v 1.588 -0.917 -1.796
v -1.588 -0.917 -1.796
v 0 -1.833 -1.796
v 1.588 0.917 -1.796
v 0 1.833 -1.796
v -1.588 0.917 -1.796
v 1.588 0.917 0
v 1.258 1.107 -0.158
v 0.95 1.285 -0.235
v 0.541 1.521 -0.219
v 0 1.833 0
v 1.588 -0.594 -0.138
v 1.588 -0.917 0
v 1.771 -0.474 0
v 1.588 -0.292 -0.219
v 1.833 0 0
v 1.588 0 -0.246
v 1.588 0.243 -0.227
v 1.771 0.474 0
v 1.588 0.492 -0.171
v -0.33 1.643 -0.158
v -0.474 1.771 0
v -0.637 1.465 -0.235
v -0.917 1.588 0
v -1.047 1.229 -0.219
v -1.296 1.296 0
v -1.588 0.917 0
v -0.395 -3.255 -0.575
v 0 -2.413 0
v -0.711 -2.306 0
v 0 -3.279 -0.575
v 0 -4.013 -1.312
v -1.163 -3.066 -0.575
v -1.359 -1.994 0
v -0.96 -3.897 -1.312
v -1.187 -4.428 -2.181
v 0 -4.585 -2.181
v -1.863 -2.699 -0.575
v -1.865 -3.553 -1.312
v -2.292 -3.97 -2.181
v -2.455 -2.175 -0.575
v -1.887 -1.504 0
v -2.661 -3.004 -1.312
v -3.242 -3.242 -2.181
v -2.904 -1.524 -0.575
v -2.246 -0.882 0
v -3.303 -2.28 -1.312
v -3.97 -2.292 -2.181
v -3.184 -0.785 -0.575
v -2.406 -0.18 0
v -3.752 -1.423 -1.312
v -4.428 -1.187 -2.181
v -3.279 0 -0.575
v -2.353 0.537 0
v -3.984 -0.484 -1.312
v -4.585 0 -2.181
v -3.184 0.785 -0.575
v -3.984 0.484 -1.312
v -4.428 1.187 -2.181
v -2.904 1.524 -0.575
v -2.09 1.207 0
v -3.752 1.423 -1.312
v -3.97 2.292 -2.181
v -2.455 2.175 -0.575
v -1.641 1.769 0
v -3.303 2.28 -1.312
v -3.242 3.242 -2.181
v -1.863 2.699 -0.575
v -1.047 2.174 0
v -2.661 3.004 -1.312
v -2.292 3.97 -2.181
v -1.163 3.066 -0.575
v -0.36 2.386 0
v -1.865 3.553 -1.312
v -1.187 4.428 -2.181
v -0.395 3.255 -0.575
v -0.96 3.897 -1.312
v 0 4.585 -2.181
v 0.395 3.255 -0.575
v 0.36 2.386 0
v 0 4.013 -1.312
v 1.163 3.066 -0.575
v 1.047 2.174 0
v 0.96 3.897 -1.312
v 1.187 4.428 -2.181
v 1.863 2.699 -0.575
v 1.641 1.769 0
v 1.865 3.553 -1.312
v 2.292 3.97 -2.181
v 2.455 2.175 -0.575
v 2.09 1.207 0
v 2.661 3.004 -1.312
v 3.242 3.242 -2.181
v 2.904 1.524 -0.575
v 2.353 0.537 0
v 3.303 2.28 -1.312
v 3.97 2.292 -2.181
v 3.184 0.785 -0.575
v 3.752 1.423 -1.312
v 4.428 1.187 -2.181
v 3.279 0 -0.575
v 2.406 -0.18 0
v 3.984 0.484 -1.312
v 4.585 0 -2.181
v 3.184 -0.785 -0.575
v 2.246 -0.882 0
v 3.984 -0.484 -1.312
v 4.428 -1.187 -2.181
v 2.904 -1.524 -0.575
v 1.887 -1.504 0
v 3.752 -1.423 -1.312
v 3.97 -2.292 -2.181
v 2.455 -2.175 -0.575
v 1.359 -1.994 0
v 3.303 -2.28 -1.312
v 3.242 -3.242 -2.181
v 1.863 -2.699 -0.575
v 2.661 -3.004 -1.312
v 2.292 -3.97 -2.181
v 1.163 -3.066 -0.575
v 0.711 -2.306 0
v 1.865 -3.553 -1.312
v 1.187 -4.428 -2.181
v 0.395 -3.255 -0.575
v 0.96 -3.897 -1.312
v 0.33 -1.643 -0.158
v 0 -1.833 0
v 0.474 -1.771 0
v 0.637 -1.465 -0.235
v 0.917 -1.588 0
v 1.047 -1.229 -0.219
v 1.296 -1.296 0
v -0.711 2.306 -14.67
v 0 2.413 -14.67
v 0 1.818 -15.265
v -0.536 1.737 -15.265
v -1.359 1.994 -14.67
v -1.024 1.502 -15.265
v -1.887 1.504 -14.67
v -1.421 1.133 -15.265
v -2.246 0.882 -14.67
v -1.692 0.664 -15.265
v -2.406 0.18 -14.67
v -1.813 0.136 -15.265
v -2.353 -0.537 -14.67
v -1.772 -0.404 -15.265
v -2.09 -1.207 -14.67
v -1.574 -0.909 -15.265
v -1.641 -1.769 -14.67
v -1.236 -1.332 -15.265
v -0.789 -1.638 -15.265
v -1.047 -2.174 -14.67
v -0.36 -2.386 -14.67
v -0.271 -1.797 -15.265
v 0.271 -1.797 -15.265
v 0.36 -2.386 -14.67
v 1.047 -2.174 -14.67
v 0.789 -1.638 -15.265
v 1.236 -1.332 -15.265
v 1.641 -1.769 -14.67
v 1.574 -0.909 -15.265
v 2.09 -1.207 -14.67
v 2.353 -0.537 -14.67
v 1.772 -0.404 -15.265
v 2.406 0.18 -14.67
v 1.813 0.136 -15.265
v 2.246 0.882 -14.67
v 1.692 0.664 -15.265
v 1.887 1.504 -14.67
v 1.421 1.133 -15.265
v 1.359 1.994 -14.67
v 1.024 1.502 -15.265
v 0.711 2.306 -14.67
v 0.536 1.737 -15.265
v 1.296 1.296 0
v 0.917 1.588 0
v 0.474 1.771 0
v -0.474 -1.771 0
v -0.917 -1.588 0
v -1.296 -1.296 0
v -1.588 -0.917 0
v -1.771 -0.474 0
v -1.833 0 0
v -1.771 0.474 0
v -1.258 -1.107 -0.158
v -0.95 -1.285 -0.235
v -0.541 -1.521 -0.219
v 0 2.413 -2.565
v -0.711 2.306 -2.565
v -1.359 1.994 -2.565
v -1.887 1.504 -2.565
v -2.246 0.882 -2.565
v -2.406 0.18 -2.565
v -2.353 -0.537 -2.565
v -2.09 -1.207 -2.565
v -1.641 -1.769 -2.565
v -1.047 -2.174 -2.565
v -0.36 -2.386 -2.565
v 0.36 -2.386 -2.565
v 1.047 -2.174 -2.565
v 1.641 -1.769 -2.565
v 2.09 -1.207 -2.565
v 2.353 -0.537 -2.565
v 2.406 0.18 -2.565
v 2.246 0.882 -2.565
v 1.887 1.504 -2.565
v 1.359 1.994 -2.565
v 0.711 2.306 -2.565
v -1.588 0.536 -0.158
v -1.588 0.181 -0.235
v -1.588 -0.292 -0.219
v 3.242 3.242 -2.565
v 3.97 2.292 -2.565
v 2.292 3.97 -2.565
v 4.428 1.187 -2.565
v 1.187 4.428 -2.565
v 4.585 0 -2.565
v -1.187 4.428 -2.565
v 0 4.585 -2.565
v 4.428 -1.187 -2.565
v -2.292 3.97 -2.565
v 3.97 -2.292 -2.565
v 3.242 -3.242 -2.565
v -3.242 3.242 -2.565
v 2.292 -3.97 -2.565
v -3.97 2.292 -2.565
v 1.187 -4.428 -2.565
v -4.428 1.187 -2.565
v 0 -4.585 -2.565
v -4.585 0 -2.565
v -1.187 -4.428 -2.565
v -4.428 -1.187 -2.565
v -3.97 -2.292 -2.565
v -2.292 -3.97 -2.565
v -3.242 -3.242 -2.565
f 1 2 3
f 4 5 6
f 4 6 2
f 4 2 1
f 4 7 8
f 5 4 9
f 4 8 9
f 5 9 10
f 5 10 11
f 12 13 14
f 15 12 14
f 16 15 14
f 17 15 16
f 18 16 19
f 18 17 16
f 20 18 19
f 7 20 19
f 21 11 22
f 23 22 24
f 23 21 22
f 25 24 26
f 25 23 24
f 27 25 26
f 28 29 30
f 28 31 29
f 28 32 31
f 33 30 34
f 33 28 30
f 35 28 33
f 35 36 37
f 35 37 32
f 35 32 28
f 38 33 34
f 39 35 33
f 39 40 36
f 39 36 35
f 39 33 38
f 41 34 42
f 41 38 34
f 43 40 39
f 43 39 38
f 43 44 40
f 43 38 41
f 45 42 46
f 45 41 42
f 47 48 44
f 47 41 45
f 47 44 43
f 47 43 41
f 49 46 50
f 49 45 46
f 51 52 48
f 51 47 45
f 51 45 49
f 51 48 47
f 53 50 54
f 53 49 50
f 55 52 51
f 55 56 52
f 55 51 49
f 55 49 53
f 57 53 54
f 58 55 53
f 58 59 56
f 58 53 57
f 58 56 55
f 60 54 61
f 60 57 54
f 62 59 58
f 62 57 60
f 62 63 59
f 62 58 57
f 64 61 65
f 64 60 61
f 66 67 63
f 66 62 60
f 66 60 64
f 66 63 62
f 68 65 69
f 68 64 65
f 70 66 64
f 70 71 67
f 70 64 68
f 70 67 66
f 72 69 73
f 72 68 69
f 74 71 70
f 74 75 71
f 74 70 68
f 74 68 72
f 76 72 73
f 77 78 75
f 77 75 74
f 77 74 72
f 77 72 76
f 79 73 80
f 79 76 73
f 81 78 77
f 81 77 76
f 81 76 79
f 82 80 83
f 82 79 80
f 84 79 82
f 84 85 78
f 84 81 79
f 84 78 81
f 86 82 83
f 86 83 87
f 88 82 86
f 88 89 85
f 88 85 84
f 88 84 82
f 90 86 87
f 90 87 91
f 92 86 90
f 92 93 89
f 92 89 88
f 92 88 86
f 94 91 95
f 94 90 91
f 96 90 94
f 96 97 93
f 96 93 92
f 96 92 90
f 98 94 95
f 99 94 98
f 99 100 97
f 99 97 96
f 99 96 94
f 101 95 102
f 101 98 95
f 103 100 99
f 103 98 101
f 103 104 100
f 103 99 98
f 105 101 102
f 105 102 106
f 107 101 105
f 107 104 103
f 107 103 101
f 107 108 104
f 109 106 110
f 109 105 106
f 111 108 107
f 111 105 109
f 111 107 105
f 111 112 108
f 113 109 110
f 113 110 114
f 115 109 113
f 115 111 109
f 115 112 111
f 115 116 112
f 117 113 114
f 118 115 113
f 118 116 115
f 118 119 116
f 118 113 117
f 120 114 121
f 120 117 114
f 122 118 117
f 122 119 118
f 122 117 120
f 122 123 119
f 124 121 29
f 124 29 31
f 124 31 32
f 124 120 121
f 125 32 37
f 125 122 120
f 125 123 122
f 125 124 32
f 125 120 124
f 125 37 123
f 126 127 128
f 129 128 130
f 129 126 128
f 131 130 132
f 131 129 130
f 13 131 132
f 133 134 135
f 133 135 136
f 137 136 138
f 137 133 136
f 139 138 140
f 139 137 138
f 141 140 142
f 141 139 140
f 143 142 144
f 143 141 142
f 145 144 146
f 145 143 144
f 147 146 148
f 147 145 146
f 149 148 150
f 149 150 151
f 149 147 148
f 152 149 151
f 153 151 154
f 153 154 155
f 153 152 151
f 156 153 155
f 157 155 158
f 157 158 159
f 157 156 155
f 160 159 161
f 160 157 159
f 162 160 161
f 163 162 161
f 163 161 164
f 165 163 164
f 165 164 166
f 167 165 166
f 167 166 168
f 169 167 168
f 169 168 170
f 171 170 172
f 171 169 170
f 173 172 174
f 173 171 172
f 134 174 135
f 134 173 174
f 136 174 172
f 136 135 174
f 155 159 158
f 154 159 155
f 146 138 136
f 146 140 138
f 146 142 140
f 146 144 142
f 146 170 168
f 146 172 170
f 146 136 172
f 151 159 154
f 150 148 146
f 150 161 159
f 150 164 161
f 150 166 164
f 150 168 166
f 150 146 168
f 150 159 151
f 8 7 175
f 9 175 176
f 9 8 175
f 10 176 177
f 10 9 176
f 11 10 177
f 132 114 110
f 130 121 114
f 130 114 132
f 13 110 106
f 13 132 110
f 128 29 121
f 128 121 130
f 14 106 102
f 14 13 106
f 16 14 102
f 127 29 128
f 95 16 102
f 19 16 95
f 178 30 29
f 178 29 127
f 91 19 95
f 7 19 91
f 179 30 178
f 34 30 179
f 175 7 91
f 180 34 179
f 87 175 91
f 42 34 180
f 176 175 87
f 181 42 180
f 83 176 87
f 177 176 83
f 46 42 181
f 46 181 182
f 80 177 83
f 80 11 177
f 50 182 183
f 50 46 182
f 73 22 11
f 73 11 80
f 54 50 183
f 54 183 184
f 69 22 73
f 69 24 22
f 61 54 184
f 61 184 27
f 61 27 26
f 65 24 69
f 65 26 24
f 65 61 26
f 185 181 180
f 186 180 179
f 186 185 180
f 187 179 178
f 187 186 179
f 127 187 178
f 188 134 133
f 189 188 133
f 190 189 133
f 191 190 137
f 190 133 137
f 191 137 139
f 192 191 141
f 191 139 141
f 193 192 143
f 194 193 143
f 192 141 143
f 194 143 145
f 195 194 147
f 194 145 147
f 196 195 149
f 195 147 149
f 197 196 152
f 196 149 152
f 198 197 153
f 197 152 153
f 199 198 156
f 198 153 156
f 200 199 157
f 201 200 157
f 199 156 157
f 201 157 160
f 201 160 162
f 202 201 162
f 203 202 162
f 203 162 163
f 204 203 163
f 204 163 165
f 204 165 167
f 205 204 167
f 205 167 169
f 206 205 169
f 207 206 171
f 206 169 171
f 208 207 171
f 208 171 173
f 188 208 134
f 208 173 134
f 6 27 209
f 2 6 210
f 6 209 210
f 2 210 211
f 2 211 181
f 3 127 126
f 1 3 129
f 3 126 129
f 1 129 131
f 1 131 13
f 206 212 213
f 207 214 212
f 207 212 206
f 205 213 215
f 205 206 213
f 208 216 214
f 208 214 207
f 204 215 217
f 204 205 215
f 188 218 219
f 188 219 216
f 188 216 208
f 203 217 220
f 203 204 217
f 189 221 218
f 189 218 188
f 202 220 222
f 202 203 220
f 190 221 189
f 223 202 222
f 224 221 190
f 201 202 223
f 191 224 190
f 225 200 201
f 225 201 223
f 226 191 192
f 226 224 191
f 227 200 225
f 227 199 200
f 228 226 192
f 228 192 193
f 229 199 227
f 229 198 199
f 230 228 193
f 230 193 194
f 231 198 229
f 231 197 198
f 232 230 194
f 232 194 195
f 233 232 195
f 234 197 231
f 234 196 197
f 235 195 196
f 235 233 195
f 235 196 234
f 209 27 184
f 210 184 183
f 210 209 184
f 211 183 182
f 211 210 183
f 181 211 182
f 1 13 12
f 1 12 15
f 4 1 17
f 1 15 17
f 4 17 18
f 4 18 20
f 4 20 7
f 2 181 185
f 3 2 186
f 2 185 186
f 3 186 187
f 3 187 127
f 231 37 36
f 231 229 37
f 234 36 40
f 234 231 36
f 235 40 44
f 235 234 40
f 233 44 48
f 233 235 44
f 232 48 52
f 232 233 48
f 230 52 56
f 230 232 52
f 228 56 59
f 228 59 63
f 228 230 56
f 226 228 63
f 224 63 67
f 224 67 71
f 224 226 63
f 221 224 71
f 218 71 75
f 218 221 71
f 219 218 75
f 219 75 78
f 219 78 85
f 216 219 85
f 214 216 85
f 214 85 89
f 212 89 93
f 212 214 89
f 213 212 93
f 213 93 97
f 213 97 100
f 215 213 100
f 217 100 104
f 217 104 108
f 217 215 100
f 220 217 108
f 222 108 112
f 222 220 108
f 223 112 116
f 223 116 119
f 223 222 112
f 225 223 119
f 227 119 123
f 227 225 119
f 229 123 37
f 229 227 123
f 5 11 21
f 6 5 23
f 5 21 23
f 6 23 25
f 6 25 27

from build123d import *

# Parameters (mm, degrees)
SKETCH1_W          = 12.7
SKETCH1_H          = 2.413
CHAMFER1_SIZE      = 0.5953125
CUT_EXTRUDE2_DEPTH = 1.79578
SKETCH6_R          = 1.833087105
CUT_EXTRUDE3_DEPTH = 1.79578
CUT_EXTRUDE3_TAPER = 45


with BuildPart() as part:
    # Sketch1 → Revolve1 (revolve)
    with BuildSketch(Plane(origin=(0, 0, 0), x_dir=(0, 0, -1), z_dir=(1, 0, 0))):
        with Locations((8.9154, 1.2065)):
            Rectangle(SKETCH1_W, SKETCH1_H)
    revolve(axis=Axis((0, 0, -15.2654), (0, 0, 1)))

    # Chamfer1
    chamfer1_edges = [part.edges().sort_by_distance(p)[0] for p in [
        (0, -2.413, -15.2654),
    ]]
    chamfer(chamfer1_edges, length=CHAMFER1_SIZE)

    # Sketch7 → Revolve2 (revolve)
    with BuildSketch(Plane(origin=(0, 0, 0), x_dir=(0, 0, -1), z_dir=(1, 0, 0))):
        with BuildLine():
            Line((2.18059, 4.5847), (2.5654, 4.5847))
            Line((2.5654, 4.5847), (2.5654, 0))
            Line((2.5654, 0), (0, 0))
            Line((0, 0), (0, 2.413))
            ThreePointArc((0, 2.413), (0.925030326, 3.664791196), (2.18059, 4.5847))
        make_face()
    revolve(axis=Axis((0, 0, 0), (0, 0, -1)))

    # Sketch5 → Cut-Extrude2 (cut)
    with BuildSketch(Plane.XY):
        Polygon((1.5875, -0.916543552), (1.5875, 0.916543552), (0, 1.833087105), (-1.5875, 0.916543552), (-1.5875, -0.916543552), (0, -1.833087105), align=None)
    extrude(amount=-CUT_EXTRUDE2_DEPTH, mode=Mode.SUBTRACT)

    # Sketch6 → Cut-Extrude3 (cut)
    with BuildSketch(Plane.XY):
        Circle(SKETCH6_R)
    extrude(amount=-CUT_EXTRUDE3_DEPTH, taper=CUT_EXTRUDE3_TAPER, mode=Mode.SUBTRACT)


solid = part.part
